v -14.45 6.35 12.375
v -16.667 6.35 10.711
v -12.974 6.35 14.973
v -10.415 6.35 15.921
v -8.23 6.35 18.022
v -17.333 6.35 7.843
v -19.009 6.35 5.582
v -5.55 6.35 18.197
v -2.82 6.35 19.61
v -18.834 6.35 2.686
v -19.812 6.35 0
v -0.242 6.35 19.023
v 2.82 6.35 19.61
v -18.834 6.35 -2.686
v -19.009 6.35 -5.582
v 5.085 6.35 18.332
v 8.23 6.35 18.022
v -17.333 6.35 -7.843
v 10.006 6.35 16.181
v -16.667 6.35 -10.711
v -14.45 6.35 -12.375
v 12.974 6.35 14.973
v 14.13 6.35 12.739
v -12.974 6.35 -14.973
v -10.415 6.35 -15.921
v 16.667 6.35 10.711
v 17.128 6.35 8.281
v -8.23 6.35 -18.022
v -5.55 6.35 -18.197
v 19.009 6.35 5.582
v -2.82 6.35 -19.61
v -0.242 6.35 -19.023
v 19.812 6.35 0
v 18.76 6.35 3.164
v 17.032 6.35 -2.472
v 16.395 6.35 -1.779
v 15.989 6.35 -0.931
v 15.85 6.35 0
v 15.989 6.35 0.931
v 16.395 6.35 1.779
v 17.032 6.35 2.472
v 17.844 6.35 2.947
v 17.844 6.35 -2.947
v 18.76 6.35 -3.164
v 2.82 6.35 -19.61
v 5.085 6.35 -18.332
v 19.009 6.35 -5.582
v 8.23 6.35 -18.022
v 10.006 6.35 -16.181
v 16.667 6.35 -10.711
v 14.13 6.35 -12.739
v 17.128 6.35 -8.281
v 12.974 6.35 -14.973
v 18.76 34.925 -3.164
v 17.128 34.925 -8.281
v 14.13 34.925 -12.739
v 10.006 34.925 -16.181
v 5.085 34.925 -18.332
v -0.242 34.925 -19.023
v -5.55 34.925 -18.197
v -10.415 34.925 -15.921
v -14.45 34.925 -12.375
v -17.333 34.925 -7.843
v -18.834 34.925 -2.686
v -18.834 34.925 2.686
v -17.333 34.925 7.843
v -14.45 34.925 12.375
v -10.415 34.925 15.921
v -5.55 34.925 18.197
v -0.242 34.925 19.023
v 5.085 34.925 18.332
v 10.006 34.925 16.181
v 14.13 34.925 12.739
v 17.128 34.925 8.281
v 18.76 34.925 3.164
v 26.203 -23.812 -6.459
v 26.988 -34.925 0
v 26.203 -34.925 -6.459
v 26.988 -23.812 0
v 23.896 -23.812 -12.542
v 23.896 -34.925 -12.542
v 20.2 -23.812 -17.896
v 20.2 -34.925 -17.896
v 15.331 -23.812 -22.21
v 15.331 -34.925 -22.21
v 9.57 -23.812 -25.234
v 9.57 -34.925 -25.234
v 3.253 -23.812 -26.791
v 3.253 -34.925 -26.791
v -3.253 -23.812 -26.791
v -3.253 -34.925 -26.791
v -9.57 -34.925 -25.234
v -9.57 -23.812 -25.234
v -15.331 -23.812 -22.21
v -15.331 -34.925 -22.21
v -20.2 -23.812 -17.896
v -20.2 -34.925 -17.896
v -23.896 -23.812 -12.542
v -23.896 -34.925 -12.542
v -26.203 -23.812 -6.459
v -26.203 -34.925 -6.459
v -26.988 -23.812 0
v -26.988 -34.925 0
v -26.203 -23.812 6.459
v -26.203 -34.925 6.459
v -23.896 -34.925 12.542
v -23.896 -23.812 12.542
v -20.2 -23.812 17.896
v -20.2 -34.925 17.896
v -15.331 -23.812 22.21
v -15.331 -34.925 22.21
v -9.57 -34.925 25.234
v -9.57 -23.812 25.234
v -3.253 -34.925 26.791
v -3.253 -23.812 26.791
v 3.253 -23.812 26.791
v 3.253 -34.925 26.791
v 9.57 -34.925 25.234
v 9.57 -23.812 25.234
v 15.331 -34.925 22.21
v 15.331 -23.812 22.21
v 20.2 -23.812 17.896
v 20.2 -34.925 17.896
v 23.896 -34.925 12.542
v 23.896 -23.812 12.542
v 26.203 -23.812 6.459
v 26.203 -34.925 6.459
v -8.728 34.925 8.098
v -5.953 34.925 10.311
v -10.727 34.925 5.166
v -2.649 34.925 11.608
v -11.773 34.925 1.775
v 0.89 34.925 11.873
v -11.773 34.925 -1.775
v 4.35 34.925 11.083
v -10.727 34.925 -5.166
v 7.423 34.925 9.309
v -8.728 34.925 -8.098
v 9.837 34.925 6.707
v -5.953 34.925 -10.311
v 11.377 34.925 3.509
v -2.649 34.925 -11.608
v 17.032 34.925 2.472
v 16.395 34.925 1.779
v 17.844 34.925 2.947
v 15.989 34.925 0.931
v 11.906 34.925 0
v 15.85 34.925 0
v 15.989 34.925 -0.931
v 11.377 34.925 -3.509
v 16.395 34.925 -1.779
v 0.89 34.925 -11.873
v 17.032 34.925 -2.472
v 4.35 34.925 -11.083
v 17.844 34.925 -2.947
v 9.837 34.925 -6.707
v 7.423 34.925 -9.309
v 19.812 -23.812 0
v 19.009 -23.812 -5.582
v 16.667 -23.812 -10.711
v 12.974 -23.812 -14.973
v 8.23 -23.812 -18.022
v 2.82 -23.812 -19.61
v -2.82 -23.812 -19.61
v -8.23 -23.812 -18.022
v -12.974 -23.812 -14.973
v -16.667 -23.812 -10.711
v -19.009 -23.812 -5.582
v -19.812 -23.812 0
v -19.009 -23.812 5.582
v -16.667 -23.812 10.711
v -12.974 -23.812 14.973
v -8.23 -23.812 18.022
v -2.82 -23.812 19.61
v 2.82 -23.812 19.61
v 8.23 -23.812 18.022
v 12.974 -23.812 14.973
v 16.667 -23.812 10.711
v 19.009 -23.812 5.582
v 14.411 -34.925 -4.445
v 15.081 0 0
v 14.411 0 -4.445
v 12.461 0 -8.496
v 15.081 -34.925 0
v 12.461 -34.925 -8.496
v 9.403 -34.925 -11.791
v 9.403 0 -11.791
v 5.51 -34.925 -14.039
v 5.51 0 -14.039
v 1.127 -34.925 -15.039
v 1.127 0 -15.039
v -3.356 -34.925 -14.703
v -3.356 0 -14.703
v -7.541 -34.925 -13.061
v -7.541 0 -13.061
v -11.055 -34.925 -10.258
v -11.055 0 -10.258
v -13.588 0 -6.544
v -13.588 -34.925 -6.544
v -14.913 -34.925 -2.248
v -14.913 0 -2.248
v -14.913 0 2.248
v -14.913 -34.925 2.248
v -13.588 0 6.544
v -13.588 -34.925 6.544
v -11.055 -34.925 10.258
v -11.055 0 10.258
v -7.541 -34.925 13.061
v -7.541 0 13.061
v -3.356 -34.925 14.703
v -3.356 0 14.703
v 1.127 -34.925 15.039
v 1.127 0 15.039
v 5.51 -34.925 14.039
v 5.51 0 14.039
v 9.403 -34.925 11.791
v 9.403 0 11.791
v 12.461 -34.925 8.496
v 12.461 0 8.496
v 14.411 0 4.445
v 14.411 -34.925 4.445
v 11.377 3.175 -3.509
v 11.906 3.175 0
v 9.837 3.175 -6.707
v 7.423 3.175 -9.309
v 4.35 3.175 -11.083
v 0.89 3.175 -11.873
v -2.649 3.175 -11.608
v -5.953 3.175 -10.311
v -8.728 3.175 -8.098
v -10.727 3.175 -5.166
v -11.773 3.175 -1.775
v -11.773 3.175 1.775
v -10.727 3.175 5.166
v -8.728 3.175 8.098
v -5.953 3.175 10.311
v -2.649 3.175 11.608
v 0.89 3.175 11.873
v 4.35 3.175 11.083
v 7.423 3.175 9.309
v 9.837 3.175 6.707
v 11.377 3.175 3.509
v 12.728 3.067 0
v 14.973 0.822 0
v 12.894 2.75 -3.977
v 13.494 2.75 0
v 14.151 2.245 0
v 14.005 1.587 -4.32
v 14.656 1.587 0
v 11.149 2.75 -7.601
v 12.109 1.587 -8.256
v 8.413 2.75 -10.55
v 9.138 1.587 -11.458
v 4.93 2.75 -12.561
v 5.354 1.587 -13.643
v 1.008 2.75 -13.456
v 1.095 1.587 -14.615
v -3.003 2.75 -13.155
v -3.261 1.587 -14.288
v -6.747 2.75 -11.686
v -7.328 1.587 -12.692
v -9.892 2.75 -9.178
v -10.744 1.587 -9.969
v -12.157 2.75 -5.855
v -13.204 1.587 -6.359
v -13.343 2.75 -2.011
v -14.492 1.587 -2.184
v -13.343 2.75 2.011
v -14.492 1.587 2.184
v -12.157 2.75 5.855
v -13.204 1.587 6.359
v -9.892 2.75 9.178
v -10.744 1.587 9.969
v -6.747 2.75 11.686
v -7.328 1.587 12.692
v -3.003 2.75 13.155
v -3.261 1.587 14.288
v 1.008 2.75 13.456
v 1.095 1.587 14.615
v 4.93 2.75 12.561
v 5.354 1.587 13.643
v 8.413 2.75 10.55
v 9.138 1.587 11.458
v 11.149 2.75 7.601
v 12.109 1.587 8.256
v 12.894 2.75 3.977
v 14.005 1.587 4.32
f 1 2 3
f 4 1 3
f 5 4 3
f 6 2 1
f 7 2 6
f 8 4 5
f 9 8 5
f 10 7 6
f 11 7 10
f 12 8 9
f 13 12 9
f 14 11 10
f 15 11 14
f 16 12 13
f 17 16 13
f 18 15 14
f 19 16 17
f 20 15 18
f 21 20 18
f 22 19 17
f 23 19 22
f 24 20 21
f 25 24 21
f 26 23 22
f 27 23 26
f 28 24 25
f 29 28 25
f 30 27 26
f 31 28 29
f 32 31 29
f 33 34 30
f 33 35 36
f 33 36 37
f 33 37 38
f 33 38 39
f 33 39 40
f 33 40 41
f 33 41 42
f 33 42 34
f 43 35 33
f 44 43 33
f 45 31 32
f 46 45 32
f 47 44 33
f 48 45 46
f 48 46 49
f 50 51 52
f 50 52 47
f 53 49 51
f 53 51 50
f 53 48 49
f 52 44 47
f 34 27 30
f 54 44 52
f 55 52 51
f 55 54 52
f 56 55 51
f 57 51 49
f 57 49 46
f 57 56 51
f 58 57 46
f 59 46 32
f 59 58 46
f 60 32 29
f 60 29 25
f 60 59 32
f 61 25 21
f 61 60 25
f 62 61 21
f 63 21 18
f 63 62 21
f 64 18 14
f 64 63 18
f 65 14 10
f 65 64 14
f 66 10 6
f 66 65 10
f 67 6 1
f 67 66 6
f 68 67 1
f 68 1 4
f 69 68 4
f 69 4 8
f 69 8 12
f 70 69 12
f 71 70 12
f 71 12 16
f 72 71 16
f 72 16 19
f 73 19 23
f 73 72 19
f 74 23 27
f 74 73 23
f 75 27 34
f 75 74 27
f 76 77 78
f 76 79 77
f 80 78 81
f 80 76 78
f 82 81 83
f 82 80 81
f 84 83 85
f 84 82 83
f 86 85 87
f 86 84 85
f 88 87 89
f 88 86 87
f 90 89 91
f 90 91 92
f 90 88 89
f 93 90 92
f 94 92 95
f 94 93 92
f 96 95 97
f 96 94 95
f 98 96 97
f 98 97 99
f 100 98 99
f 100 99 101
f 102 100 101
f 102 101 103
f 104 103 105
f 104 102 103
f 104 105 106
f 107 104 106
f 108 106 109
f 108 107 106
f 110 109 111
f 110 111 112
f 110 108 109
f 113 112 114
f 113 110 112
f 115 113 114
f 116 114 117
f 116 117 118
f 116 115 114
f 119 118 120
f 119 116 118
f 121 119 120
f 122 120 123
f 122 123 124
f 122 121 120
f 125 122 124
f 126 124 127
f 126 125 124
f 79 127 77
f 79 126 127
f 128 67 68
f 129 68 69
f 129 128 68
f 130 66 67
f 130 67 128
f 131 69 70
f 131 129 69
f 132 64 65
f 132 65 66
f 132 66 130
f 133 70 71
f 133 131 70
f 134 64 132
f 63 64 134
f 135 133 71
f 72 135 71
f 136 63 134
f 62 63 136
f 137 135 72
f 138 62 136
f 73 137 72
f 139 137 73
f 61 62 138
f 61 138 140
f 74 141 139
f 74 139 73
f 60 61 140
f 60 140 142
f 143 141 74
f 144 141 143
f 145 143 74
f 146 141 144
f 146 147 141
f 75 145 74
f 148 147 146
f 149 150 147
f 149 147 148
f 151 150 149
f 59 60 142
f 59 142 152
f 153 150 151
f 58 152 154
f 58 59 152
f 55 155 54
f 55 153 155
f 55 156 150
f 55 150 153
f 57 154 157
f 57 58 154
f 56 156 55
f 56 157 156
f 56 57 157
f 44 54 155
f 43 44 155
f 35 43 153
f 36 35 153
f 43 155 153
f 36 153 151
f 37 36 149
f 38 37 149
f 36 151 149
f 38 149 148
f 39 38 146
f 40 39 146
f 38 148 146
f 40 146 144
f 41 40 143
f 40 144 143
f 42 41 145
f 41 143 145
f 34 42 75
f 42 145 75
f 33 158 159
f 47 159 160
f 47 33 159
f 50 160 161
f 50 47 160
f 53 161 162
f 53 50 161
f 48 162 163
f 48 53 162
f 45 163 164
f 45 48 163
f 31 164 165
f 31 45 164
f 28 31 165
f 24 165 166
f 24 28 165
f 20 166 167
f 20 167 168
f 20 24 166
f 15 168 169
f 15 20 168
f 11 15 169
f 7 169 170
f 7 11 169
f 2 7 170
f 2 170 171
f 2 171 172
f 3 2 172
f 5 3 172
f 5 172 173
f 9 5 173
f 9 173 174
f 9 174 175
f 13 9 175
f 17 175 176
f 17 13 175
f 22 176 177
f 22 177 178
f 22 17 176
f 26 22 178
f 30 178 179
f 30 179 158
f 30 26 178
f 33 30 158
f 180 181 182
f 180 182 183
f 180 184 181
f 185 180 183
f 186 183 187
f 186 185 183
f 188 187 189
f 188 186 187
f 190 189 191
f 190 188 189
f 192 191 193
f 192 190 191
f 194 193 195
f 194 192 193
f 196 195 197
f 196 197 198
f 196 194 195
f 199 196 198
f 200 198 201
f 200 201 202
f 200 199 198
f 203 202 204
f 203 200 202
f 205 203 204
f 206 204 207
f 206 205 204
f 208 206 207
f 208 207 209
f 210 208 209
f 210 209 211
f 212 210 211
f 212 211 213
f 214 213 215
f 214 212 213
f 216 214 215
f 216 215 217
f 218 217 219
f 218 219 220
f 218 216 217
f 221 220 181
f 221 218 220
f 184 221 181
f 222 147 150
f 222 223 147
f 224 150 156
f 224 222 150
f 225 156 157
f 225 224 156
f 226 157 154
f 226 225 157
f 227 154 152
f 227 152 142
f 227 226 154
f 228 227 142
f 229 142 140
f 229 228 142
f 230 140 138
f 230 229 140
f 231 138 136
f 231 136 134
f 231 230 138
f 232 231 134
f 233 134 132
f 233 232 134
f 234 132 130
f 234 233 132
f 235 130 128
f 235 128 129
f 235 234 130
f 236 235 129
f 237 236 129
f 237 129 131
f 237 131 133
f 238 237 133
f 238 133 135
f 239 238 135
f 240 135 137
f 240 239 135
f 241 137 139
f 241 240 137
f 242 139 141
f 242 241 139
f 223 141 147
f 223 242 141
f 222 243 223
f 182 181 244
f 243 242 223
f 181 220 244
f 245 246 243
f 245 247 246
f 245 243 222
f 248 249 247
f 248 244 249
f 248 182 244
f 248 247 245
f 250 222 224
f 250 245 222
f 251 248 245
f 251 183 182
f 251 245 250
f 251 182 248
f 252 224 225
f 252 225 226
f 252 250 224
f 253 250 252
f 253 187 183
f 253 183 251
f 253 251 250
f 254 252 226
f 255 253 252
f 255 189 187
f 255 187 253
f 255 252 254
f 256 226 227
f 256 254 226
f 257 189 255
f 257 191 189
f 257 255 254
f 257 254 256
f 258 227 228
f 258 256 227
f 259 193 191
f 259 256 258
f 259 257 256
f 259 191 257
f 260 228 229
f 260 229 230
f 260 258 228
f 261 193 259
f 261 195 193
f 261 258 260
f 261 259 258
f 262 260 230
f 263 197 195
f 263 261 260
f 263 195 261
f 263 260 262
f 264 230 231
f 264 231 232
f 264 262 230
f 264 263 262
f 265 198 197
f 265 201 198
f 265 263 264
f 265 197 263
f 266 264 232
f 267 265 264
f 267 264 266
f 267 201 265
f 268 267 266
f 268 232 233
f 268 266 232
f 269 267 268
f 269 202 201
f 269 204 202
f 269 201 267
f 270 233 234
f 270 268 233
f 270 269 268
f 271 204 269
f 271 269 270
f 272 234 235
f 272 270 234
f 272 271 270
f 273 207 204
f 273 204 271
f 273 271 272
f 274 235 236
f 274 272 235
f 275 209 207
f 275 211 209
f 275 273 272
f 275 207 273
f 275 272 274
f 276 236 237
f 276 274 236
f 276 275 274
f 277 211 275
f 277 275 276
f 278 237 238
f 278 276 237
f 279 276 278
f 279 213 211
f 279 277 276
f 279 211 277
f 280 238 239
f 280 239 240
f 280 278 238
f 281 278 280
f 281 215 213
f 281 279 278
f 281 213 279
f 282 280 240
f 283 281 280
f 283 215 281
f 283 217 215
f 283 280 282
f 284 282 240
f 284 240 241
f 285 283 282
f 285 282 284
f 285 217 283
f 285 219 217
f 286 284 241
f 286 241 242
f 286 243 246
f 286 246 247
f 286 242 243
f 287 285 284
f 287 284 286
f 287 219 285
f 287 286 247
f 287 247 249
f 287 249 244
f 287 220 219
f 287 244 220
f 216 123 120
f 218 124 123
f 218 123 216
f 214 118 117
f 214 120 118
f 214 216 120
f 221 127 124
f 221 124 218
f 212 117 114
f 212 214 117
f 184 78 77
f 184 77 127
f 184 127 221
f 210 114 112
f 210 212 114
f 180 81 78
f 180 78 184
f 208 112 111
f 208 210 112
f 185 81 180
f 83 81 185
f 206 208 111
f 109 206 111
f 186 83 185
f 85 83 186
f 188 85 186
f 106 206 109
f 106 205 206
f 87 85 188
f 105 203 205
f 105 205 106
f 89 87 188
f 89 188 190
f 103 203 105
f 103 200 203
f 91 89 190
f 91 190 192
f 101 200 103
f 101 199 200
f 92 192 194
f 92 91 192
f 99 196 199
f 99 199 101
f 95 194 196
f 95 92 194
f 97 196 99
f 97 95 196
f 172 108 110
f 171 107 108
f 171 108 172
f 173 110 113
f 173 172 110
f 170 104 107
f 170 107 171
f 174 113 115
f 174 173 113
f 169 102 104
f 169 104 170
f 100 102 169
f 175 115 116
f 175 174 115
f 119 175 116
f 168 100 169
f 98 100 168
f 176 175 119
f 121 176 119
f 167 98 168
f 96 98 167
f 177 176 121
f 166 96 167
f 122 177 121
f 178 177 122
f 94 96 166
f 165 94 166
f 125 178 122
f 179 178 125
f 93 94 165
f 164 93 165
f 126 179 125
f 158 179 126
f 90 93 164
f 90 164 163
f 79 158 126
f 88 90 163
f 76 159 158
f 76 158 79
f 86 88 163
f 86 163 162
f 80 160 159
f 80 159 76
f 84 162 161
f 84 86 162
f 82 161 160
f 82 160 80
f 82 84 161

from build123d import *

# Parameters (mm, degrees)
SKETCH2_R          = 3.175
CUT_EXTRUDE1_DEPTH = 28.575


with BuildPart() as part:
    # Sketch1 → Revolve1 (revolve)
    with BuildSketch(Plane.XY):
        with BuildLine():
            Line((15.08125, -34.925), (26.9875, -34.925))
            Line((26.9875, -34.925), (26.9875, -23.8125))
            Line((26.9875, -23.8125), (19.812, -23.8125))
            Line((19.812, -23.8125), (19.812, 6.35))
            Line((19.812, 6.35), (19.0246, 6.35))
            Line((19.0246, 6.35), (19.0246, 34.925))
            Line((19.0246, 34.925), (11.90625, 34.925))
            Line((11.90625, 34.925), (11.90625, 3.175))
            ThreePointArc((11.90625, 3.175), (14.15131403, 2.24506403), (15.08125, 0))
            Line((15.08125, 0), (15.08125, -34.925))
        make_face()
    revolve(axis=Axis((0, -34.925, 0), (0, 1, 0)))

    # Sketch2 → Cut-Extrude1 (cut)
    with BuildSketch(Plane(origin=(0, 34.925, 0), x_dir=(1, 0, 0), z_dir=(0, 1, 0))):
        with Locations((19.0246, 0)):
            Circle(SKETCH2_R)
    extrude(amount=-CUT_EXTRUDE1_DEPTH, mode=Mode.SUBTRACT)


solid = part.part
